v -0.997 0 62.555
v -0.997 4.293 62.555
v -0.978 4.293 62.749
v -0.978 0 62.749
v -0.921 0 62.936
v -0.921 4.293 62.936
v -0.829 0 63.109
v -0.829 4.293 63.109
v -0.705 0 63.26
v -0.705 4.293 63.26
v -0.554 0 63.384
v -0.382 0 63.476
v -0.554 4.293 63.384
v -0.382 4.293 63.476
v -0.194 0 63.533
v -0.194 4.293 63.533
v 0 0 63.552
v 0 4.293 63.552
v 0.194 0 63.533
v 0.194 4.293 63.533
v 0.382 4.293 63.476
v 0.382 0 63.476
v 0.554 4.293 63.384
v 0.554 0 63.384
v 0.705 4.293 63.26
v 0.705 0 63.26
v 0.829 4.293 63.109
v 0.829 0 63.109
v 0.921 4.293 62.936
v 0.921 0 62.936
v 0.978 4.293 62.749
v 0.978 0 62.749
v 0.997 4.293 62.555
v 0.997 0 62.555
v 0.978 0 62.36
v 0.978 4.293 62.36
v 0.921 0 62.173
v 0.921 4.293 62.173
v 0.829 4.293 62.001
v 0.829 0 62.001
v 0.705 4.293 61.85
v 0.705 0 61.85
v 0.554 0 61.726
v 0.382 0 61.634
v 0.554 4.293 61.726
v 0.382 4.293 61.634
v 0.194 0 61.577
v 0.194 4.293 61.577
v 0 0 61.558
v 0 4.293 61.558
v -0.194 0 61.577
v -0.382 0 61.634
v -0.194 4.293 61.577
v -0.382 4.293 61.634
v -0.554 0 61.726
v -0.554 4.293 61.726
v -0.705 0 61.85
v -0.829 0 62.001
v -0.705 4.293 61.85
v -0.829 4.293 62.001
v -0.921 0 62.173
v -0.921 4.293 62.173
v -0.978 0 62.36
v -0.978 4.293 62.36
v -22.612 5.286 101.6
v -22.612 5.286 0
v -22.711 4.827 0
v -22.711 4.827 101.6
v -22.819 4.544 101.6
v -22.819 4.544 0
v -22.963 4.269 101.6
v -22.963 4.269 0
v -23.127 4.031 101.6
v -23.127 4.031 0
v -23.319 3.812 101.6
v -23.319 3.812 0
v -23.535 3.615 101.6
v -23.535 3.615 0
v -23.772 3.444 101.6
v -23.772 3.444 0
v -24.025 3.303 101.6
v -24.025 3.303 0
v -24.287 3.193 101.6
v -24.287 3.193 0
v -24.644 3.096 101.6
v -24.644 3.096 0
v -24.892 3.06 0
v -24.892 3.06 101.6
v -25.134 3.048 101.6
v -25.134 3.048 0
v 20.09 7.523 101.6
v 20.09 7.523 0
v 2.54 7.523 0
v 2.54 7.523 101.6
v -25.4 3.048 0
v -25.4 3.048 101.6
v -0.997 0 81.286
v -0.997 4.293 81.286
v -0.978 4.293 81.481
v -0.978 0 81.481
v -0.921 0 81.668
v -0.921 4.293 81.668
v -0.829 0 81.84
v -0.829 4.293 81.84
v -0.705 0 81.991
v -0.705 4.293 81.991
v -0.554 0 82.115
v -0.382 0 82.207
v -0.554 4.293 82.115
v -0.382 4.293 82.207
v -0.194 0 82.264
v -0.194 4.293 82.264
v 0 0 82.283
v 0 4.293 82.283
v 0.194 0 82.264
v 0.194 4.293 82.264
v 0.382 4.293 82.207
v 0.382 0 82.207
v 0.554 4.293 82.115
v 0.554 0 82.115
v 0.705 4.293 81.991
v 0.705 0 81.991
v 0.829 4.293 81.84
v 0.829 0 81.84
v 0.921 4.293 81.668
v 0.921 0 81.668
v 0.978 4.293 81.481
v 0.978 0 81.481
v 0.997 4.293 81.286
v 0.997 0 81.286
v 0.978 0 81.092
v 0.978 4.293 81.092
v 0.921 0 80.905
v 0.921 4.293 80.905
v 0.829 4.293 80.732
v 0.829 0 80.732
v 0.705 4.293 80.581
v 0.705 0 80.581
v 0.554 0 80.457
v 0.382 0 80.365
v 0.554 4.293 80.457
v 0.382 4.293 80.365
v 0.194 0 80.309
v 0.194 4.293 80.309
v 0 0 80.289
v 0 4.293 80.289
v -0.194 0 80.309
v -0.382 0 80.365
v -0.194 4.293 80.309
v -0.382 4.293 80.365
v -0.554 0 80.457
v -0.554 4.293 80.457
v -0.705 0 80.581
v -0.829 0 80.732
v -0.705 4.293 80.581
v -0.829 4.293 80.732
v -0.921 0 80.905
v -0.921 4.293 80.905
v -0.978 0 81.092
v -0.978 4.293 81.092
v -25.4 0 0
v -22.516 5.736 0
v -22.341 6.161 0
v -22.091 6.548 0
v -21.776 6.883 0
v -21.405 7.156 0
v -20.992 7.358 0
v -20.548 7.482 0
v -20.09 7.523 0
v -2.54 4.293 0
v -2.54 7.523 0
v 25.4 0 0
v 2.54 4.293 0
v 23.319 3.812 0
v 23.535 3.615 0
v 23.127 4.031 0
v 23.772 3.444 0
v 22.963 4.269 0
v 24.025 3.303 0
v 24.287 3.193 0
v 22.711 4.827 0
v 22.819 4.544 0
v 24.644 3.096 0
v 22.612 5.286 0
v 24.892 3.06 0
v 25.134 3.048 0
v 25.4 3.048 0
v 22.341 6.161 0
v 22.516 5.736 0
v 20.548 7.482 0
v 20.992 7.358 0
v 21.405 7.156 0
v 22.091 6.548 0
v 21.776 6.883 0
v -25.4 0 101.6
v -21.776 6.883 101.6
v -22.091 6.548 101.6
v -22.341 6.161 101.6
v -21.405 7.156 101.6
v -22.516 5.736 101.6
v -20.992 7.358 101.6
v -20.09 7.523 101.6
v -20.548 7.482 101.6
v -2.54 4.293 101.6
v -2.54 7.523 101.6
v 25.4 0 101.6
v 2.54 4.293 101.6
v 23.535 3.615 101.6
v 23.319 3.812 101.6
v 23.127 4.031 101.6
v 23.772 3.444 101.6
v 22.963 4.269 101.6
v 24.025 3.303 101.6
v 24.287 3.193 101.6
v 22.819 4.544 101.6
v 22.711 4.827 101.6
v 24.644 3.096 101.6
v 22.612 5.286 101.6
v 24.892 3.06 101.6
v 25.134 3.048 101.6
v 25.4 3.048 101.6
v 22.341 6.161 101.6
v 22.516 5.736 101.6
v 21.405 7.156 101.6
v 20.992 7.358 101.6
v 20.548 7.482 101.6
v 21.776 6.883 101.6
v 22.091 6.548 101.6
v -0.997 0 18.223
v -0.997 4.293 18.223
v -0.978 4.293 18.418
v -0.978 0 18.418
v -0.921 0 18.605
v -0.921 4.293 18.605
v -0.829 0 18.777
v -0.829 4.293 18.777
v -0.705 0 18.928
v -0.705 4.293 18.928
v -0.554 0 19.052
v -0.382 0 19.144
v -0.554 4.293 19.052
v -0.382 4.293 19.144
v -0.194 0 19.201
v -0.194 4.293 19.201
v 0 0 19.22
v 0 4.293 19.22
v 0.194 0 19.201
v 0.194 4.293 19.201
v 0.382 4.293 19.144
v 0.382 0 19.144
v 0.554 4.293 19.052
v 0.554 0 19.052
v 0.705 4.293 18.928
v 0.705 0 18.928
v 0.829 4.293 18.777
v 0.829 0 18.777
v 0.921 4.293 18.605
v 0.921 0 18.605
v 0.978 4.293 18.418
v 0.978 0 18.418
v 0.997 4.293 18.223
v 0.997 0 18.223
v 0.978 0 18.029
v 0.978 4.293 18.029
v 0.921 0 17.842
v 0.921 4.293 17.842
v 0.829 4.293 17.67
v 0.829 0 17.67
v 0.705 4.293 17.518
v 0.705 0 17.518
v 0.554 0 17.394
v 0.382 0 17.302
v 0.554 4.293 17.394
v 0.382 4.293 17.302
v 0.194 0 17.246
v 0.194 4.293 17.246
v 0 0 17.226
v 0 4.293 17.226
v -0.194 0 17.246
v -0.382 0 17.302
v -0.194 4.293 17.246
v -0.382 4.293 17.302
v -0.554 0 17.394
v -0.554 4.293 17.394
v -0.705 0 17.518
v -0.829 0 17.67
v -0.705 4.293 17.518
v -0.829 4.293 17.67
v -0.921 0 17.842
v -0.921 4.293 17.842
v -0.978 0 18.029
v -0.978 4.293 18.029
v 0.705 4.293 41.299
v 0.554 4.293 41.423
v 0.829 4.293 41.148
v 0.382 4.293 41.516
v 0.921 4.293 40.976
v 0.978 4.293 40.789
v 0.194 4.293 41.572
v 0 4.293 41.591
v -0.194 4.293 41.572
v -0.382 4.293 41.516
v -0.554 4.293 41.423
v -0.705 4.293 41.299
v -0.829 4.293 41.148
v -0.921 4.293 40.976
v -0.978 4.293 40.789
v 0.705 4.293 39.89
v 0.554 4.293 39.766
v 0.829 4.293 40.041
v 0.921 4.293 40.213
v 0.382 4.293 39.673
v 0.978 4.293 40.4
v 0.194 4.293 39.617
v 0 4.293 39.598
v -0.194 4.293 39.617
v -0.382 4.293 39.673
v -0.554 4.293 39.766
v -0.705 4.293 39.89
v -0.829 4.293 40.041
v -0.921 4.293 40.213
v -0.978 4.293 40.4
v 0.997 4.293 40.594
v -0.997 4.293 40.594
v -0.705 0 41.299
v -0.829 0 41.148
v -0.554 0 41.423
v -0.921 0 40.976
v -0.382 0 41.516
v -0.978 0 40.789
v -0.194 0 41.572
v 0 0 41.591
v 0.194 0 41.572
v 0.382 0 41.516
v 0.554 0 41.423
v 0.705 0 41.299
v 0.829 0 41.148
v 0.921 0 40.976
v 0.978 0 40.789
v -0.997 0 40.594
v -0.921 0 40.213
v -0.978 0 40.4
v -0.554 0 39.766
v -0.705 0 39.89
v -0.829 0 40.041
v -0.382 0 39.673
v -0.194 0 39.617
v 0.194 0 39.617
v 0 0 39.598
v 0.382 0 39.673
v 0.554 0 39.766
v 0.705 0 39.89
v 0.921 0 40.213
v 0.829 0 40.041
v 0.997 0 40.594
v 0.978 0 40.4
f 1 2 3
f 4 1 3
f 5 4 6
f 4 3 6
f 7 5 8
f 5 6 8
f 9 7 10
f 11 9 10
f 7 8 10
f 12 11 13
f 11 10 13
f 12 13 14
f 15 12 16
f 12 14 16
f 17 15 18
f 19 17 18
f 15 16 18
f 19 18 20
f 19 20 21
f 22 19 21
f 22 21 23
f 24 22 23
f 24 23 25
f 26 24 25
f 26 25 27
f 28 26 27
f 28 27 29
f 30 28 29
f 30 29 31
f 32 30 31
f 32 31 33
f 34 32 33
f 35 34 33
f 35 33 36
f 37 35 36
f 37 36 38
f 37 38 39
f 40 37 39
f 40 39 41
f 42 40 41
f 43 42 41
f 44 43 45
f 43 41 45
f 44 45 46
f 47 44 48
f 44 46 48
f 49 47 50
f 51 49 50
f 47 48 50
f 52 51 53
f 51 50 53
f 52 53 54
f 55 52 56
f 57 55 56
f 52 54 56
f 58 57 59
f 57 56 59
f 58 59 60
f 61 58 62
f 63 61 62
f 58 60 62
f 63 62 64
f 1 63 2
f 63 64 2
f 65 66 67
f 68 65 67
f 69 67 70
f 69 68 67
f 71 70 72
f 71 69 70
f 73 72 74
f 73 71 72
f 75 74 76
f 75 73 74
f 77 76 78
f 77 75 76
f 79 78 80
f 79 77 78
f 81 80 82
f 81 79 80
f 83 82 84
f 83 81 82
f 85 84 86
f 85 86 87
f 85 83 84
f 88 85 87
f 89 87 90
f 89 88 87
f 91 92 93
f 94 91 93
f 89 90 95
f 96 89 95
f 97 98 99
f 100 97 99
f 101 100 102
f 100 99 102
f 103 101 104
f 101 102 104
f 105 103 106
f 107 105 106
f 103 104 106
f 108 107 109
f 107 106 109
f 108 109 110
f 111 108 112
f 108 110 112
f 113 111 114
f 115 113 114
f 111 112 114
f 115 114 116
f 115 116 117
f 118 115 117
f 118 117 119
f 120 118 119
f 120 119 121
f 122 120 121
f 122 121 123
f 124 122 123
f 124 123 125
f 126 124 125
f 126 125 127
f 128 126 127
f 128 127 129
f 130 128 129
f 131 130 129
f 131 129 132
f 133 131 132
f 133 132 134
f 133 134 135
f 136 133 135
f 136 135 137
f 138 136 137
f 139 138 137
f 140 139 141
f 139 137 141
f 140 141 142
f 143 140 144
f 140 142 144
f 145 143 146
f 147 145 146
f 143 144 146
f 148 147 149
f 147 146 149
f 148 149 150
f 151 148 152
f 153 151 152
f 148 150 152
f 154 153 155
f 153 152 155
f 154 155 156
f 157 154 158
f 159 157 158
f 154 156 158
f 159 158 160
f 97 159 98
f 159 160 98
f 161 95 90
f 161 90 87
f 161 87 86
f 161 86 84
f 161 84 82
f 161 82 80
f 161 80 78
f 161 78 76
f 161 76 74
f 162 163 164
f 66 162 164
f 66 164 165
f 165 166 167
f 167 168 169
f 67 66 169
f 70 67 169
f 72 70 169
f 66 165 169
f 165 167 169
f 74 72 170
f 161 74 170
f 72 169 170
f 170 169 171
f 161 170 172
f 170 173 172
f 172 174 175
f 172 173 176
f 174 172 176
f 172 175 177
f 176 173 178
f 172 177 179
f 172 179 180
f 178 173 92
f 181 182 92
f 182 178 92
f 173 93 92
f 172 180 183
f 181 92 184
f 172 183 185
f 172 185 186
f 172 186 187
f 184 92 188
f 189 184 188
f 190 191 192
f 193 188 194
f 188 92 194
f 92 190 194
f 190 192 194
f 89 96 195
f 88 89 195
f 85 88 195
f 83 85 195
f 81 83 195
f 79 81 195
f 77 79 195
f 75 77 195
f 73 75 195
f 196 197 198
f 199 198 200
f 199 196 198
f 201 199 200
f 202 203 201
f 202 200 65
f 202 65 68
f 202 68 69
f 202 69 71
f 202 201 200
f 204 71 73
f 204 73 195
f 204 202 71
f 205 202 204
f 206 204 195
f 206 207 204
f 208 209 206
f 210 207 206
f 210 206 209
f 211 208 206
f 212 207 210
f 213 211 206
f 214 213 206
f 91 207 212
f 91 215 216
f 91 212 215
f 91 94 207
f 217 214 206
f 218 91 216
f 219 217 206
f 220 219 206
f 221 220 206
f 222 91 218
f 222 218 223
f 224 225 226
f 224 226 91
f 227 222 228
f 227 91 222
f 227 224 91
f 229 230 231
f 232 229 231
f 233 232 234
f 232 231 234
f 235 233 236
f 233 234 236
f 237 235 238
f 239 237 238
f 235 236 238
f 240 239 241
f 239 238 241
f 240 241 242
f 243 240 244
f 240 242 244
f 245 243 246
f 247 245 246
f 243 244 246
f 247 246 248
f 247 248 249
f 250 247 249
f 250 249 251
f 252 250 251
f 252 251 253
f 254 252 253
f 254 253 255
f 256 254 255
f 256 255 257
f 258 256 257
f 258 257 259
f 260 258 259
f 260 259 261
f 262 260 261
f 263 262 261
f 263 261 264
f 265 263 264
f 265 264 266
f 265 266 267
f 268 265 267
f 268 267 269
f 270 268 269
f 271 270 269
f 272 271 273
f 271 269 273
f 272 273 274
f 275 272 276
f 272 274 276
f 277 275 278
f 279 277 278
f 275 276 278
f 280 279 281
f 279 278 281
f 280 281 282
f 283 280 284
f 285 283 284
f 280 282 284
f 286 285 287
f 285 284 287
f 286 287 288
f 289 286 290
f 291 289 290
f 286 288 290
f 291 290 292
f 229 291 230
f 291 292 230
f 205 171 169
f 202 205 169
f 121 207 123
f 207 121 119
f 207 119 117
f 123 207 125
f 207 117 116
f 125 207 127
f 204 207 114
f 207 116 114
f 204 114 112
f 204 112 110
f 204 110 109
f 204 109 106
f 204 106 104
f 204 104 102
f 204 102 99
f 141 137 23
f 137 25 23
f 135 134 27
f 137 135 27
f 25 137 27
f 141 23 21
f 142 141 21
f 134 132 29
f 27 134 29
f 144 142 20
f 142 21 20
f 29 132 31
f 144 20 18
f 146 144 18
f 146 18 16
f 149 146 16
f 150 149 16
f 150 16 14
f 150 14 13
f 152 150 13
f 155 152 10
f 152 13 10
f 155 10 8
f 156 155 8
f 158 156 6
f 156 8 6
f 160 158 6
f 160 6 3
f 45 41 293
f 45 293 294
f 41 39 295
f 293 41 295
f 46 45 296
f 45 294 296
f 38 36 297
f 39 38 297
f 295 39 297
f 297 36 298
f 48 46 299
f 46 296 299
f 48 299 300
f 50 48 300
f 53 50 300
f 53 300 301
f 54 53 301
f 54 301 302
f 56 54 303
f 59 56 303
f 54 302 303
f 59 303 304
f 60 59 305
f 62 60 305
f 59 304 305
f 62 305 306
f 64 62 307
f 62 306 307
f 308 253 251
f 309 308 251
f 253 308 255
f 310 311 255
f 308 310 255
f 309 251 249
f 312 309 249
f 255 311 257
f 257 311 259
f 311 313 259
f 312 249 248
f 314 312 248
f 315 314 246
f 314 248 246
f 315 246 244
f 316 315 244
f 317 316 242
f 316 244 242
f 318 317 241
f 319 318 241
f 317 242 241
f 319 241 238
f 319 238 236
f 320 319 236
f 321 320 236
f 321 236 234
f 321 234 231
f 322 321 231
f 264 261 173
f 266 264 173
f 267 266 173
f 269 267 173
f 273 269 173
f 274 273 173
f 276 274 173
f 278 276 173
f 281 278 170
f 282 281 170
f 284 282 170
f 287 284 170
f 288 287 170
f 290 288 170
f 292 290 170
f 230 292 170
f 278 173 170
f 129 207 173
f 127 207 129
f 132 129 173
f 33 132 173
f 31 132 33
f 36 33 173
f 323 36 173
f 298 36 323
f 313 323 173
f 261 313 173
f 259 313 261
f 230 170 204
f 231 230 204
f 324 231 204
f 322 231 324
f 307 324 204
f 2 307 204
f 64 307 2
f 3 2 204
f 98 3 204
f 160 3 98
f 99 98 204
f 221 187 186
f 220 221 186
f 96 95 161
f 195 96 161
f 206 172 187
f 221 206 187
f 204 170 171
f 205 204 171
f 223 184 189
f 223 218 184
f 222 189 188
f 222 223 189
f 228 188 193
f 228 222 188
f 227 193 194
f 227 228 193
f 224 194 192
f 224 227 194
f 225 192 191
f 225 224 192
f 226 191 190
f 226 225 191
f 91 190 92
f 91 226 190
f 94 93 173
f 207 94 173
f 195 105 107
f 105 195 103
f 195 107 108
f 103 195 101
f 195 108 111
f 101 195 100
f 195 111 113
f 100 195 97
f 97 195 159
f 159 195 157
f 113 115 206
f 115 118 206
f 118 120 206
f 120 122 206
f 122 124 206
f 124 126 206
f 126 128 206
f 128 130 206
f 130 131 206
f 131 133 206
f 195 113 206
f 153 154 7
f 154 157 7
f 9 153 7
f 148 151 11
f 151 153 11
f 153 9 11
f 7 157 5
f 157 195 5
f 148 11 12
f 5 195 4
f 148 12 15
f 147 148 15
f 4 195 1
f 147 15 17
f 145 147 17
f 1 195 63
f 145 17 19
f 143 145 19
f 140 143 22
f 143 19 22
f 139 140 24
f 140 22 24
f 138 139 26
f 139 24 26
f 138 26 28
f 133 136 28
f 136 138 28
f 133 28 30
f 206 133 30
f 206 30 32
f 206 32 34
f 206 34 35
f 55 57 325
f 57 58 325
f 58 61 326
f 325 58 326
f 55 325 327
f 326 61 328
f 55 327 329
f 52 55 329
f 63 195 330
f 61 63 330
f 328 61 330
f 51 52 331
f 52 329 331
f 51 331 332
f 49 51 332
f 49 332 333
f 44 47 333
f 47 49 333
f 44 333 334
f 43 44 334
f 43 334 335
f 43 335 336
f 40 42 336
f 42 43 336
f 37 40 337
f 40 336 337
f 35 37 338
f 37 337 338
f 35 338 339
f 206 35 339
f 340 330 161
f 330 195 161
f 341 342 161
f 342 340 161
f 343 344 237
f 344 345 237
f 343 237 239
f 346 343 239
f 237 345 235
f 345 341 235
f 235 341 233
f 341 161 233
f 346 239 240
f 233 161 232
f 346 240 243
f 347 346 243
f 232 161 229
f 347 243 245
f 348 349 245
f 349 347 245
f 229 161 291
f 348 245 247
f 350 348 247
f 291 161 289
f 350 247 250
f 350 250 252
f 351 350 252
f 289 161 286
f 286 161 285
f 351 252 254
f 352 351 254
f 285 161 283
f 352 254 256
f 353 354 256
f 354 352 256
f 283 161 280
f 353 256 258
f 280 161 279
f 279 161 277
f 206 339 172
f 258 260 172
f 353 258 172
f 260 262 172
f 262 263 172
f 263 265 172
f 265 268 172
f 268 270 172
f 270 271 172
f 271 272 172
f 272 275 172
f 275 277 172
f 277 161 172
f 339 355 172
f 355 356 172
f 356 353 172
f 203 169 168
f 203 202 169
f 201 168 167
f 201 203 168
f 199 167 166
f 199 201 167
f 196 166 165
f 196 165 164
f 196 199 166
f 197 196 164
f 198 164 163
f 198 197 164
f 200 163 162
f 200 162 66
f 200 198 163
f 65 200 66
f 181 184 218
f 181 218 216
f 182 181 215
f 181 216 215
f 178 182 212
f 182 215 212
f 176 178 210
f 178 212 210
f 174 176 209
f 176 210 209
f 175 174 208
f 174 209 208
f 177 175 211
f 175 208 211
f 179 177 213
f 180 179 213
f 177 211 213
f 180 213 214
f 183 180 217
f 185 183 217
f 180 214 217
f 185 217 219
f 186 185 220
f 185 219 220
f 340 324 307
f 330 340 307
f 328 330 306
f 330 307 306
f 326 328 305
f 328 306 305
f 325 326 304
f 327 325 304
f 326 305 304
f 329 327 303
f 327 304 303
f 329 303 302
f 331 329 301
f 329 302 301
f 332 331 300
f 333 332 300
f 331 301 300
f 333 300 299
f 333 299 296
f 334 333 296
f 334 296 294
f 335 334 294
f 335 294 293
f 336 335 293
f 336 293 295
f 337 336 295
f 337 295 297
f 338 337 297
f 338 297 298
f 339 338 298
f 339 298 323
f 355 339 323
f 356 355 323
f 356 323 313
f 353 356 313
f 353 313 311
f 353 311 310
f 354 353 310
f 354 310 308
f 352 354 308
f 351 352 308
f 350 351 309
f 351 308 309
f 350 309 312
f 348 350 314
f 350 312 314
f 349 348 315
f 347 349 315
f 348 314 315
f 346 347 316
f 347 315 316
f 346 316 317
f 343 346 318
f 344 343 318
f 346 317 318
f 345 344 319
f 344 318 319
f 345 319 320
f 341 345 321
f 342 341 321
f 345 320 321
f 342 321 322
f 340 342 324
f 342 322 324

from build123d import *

# Parameters (mm, degrees)
F1_DEPTH = 101.6
F2_R     = 2.54
F3_R     = 2.54
F4_R     = 2.54
F5_R     = 2.54
F7_D     = 1.9939


with BuildPart() as f1:
    # F0 (on Top) → F1 (new body)
    with BuildSketch(Plane.XY):
        Polygon((-25.4, 0), (0, 0), (25.4, 0), (25.4, 3.048), (22.6301808, 3.048), (22.6301808, 7.5232392634), (2.54, 7.5232392634), (2.54, 4.2931226644), (0, 4.2931226644), (-2.54, 4.2931226644), (-2.54, 7.5232392634), (-22.6301808, 7.5232392634), (-22.6301808, 3.048), (-25.4, 3.048), align=None)
    extrude(amount=F1_DEPTH)

    # F2
    f2_edges = [f1.edges().sort_by_distance(p)[0] for p in [
        (22.630181, 7.523239, 50.8),
    ]]
    fillet(f2_edges, radius=F2_R)

    # F3
    f3_edges = [f1.edges().sort_by_distance(p)[0] for p in [
        (22.630181, 3.048, 50.8),
    ]]
    fillet(f3_edges, radius=F3_R)

    # F4
    f4_edges = [f1.edges().sort_by_distance(p)[0] for p in [
        (-22.630181, 7.523239, 50.8),
    ]]
    fillet(f4_edges, radius=F4_R)

    # F5
    f5_edges = [f1.edges().sort_by_distance(p)[0] for p in [
        (-22.630181, 3.048, 50.8),
        (-22.630181, 4.983239, 50.8),
    ]]
    fillet(f5_edges, radius=F5_R)

    # F7 (through all)
    with Locations(Plane.XZ):
        with Locations((0, 81.2863707542), (0, 62.5548958778), (0, 40.594484657), (0, 18.223406747)):
            Hole(F7_D / 2)


solid = f1.part
